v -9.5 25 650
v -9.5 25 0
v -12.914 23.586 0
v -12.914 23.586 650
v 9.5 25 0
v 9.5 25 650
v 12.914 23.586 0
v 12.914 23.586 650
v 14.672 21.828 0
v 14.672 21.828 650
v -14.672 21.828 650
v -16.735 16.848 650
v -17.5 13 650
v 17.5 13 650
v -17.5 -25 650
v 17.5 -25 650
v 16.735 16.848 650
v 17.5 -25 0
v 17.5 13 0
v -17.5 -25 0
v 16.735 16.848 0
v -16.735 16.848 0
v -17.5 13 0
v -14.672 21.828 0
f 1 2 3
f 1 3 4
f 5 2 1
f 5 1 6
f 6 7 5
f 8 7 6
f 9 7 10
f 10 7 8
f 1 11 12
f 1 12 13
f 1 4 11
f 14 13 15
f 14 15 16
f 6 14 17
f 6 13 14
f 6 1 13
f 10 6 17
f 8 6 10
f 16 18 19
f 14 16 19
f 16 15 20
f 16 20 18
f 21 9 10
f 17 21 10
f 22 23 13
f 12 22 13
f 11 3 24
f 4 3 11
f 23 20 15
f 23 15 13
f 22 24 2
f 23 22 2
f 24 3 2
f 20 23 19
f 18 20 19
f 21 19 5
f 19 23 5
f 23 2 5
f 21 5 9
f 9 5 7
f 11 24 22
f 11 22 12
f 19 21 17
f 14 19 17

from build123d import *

# Parameters (mm, degrees)
F0_W     = 35
F0_H     = 50
F1_DEPTH = 650
F2_SIZE  = 6
F3_SIZE  = 4
F4_SIZE  = 2
F5_SIZE  = 2


with BuildPart() as f1:
    # F0 (on Top) → F1 (new body)
    with BuildSketch(Plane.XY):
        Rectangle(F0_W, F0_H)
    extrude(amount=F1_DEPTH)

    # F2
    f2_edges = [f1.edges().sort_by_distance(p)[0] for p in [
        (-17.5, 25, 325),
        (17.5, 25, 325),
    ]]
    chamfer(f2_edges, length=F2_SIZE)

    # F3
    f3_edges = [f1.edges().sort_by_distance(p)[0] for p in [
        (-17.5, 19, 325),
        (17.5, 19, 325),
    ]]
    chamfer(f3_edges, length=F3_SIZE)

    # F4
    f4_edges = [f1.edges().sort_by_distance(p)[0] for p in [
        (-11.5, 25, 325),
        (11.5, 25, 325),
    ]]
    chamfer(f4_edges, length=F4_SIZE)

    # F5
    f5_edges = [f1.edges().sort_by_distance(p)[0] for p in [
        (-17.5, 15, 325),
        (17.5, 15, 325),
    ]]
    chamfer(f5_edges, length=F5_SIZE)


solid = f1.part
